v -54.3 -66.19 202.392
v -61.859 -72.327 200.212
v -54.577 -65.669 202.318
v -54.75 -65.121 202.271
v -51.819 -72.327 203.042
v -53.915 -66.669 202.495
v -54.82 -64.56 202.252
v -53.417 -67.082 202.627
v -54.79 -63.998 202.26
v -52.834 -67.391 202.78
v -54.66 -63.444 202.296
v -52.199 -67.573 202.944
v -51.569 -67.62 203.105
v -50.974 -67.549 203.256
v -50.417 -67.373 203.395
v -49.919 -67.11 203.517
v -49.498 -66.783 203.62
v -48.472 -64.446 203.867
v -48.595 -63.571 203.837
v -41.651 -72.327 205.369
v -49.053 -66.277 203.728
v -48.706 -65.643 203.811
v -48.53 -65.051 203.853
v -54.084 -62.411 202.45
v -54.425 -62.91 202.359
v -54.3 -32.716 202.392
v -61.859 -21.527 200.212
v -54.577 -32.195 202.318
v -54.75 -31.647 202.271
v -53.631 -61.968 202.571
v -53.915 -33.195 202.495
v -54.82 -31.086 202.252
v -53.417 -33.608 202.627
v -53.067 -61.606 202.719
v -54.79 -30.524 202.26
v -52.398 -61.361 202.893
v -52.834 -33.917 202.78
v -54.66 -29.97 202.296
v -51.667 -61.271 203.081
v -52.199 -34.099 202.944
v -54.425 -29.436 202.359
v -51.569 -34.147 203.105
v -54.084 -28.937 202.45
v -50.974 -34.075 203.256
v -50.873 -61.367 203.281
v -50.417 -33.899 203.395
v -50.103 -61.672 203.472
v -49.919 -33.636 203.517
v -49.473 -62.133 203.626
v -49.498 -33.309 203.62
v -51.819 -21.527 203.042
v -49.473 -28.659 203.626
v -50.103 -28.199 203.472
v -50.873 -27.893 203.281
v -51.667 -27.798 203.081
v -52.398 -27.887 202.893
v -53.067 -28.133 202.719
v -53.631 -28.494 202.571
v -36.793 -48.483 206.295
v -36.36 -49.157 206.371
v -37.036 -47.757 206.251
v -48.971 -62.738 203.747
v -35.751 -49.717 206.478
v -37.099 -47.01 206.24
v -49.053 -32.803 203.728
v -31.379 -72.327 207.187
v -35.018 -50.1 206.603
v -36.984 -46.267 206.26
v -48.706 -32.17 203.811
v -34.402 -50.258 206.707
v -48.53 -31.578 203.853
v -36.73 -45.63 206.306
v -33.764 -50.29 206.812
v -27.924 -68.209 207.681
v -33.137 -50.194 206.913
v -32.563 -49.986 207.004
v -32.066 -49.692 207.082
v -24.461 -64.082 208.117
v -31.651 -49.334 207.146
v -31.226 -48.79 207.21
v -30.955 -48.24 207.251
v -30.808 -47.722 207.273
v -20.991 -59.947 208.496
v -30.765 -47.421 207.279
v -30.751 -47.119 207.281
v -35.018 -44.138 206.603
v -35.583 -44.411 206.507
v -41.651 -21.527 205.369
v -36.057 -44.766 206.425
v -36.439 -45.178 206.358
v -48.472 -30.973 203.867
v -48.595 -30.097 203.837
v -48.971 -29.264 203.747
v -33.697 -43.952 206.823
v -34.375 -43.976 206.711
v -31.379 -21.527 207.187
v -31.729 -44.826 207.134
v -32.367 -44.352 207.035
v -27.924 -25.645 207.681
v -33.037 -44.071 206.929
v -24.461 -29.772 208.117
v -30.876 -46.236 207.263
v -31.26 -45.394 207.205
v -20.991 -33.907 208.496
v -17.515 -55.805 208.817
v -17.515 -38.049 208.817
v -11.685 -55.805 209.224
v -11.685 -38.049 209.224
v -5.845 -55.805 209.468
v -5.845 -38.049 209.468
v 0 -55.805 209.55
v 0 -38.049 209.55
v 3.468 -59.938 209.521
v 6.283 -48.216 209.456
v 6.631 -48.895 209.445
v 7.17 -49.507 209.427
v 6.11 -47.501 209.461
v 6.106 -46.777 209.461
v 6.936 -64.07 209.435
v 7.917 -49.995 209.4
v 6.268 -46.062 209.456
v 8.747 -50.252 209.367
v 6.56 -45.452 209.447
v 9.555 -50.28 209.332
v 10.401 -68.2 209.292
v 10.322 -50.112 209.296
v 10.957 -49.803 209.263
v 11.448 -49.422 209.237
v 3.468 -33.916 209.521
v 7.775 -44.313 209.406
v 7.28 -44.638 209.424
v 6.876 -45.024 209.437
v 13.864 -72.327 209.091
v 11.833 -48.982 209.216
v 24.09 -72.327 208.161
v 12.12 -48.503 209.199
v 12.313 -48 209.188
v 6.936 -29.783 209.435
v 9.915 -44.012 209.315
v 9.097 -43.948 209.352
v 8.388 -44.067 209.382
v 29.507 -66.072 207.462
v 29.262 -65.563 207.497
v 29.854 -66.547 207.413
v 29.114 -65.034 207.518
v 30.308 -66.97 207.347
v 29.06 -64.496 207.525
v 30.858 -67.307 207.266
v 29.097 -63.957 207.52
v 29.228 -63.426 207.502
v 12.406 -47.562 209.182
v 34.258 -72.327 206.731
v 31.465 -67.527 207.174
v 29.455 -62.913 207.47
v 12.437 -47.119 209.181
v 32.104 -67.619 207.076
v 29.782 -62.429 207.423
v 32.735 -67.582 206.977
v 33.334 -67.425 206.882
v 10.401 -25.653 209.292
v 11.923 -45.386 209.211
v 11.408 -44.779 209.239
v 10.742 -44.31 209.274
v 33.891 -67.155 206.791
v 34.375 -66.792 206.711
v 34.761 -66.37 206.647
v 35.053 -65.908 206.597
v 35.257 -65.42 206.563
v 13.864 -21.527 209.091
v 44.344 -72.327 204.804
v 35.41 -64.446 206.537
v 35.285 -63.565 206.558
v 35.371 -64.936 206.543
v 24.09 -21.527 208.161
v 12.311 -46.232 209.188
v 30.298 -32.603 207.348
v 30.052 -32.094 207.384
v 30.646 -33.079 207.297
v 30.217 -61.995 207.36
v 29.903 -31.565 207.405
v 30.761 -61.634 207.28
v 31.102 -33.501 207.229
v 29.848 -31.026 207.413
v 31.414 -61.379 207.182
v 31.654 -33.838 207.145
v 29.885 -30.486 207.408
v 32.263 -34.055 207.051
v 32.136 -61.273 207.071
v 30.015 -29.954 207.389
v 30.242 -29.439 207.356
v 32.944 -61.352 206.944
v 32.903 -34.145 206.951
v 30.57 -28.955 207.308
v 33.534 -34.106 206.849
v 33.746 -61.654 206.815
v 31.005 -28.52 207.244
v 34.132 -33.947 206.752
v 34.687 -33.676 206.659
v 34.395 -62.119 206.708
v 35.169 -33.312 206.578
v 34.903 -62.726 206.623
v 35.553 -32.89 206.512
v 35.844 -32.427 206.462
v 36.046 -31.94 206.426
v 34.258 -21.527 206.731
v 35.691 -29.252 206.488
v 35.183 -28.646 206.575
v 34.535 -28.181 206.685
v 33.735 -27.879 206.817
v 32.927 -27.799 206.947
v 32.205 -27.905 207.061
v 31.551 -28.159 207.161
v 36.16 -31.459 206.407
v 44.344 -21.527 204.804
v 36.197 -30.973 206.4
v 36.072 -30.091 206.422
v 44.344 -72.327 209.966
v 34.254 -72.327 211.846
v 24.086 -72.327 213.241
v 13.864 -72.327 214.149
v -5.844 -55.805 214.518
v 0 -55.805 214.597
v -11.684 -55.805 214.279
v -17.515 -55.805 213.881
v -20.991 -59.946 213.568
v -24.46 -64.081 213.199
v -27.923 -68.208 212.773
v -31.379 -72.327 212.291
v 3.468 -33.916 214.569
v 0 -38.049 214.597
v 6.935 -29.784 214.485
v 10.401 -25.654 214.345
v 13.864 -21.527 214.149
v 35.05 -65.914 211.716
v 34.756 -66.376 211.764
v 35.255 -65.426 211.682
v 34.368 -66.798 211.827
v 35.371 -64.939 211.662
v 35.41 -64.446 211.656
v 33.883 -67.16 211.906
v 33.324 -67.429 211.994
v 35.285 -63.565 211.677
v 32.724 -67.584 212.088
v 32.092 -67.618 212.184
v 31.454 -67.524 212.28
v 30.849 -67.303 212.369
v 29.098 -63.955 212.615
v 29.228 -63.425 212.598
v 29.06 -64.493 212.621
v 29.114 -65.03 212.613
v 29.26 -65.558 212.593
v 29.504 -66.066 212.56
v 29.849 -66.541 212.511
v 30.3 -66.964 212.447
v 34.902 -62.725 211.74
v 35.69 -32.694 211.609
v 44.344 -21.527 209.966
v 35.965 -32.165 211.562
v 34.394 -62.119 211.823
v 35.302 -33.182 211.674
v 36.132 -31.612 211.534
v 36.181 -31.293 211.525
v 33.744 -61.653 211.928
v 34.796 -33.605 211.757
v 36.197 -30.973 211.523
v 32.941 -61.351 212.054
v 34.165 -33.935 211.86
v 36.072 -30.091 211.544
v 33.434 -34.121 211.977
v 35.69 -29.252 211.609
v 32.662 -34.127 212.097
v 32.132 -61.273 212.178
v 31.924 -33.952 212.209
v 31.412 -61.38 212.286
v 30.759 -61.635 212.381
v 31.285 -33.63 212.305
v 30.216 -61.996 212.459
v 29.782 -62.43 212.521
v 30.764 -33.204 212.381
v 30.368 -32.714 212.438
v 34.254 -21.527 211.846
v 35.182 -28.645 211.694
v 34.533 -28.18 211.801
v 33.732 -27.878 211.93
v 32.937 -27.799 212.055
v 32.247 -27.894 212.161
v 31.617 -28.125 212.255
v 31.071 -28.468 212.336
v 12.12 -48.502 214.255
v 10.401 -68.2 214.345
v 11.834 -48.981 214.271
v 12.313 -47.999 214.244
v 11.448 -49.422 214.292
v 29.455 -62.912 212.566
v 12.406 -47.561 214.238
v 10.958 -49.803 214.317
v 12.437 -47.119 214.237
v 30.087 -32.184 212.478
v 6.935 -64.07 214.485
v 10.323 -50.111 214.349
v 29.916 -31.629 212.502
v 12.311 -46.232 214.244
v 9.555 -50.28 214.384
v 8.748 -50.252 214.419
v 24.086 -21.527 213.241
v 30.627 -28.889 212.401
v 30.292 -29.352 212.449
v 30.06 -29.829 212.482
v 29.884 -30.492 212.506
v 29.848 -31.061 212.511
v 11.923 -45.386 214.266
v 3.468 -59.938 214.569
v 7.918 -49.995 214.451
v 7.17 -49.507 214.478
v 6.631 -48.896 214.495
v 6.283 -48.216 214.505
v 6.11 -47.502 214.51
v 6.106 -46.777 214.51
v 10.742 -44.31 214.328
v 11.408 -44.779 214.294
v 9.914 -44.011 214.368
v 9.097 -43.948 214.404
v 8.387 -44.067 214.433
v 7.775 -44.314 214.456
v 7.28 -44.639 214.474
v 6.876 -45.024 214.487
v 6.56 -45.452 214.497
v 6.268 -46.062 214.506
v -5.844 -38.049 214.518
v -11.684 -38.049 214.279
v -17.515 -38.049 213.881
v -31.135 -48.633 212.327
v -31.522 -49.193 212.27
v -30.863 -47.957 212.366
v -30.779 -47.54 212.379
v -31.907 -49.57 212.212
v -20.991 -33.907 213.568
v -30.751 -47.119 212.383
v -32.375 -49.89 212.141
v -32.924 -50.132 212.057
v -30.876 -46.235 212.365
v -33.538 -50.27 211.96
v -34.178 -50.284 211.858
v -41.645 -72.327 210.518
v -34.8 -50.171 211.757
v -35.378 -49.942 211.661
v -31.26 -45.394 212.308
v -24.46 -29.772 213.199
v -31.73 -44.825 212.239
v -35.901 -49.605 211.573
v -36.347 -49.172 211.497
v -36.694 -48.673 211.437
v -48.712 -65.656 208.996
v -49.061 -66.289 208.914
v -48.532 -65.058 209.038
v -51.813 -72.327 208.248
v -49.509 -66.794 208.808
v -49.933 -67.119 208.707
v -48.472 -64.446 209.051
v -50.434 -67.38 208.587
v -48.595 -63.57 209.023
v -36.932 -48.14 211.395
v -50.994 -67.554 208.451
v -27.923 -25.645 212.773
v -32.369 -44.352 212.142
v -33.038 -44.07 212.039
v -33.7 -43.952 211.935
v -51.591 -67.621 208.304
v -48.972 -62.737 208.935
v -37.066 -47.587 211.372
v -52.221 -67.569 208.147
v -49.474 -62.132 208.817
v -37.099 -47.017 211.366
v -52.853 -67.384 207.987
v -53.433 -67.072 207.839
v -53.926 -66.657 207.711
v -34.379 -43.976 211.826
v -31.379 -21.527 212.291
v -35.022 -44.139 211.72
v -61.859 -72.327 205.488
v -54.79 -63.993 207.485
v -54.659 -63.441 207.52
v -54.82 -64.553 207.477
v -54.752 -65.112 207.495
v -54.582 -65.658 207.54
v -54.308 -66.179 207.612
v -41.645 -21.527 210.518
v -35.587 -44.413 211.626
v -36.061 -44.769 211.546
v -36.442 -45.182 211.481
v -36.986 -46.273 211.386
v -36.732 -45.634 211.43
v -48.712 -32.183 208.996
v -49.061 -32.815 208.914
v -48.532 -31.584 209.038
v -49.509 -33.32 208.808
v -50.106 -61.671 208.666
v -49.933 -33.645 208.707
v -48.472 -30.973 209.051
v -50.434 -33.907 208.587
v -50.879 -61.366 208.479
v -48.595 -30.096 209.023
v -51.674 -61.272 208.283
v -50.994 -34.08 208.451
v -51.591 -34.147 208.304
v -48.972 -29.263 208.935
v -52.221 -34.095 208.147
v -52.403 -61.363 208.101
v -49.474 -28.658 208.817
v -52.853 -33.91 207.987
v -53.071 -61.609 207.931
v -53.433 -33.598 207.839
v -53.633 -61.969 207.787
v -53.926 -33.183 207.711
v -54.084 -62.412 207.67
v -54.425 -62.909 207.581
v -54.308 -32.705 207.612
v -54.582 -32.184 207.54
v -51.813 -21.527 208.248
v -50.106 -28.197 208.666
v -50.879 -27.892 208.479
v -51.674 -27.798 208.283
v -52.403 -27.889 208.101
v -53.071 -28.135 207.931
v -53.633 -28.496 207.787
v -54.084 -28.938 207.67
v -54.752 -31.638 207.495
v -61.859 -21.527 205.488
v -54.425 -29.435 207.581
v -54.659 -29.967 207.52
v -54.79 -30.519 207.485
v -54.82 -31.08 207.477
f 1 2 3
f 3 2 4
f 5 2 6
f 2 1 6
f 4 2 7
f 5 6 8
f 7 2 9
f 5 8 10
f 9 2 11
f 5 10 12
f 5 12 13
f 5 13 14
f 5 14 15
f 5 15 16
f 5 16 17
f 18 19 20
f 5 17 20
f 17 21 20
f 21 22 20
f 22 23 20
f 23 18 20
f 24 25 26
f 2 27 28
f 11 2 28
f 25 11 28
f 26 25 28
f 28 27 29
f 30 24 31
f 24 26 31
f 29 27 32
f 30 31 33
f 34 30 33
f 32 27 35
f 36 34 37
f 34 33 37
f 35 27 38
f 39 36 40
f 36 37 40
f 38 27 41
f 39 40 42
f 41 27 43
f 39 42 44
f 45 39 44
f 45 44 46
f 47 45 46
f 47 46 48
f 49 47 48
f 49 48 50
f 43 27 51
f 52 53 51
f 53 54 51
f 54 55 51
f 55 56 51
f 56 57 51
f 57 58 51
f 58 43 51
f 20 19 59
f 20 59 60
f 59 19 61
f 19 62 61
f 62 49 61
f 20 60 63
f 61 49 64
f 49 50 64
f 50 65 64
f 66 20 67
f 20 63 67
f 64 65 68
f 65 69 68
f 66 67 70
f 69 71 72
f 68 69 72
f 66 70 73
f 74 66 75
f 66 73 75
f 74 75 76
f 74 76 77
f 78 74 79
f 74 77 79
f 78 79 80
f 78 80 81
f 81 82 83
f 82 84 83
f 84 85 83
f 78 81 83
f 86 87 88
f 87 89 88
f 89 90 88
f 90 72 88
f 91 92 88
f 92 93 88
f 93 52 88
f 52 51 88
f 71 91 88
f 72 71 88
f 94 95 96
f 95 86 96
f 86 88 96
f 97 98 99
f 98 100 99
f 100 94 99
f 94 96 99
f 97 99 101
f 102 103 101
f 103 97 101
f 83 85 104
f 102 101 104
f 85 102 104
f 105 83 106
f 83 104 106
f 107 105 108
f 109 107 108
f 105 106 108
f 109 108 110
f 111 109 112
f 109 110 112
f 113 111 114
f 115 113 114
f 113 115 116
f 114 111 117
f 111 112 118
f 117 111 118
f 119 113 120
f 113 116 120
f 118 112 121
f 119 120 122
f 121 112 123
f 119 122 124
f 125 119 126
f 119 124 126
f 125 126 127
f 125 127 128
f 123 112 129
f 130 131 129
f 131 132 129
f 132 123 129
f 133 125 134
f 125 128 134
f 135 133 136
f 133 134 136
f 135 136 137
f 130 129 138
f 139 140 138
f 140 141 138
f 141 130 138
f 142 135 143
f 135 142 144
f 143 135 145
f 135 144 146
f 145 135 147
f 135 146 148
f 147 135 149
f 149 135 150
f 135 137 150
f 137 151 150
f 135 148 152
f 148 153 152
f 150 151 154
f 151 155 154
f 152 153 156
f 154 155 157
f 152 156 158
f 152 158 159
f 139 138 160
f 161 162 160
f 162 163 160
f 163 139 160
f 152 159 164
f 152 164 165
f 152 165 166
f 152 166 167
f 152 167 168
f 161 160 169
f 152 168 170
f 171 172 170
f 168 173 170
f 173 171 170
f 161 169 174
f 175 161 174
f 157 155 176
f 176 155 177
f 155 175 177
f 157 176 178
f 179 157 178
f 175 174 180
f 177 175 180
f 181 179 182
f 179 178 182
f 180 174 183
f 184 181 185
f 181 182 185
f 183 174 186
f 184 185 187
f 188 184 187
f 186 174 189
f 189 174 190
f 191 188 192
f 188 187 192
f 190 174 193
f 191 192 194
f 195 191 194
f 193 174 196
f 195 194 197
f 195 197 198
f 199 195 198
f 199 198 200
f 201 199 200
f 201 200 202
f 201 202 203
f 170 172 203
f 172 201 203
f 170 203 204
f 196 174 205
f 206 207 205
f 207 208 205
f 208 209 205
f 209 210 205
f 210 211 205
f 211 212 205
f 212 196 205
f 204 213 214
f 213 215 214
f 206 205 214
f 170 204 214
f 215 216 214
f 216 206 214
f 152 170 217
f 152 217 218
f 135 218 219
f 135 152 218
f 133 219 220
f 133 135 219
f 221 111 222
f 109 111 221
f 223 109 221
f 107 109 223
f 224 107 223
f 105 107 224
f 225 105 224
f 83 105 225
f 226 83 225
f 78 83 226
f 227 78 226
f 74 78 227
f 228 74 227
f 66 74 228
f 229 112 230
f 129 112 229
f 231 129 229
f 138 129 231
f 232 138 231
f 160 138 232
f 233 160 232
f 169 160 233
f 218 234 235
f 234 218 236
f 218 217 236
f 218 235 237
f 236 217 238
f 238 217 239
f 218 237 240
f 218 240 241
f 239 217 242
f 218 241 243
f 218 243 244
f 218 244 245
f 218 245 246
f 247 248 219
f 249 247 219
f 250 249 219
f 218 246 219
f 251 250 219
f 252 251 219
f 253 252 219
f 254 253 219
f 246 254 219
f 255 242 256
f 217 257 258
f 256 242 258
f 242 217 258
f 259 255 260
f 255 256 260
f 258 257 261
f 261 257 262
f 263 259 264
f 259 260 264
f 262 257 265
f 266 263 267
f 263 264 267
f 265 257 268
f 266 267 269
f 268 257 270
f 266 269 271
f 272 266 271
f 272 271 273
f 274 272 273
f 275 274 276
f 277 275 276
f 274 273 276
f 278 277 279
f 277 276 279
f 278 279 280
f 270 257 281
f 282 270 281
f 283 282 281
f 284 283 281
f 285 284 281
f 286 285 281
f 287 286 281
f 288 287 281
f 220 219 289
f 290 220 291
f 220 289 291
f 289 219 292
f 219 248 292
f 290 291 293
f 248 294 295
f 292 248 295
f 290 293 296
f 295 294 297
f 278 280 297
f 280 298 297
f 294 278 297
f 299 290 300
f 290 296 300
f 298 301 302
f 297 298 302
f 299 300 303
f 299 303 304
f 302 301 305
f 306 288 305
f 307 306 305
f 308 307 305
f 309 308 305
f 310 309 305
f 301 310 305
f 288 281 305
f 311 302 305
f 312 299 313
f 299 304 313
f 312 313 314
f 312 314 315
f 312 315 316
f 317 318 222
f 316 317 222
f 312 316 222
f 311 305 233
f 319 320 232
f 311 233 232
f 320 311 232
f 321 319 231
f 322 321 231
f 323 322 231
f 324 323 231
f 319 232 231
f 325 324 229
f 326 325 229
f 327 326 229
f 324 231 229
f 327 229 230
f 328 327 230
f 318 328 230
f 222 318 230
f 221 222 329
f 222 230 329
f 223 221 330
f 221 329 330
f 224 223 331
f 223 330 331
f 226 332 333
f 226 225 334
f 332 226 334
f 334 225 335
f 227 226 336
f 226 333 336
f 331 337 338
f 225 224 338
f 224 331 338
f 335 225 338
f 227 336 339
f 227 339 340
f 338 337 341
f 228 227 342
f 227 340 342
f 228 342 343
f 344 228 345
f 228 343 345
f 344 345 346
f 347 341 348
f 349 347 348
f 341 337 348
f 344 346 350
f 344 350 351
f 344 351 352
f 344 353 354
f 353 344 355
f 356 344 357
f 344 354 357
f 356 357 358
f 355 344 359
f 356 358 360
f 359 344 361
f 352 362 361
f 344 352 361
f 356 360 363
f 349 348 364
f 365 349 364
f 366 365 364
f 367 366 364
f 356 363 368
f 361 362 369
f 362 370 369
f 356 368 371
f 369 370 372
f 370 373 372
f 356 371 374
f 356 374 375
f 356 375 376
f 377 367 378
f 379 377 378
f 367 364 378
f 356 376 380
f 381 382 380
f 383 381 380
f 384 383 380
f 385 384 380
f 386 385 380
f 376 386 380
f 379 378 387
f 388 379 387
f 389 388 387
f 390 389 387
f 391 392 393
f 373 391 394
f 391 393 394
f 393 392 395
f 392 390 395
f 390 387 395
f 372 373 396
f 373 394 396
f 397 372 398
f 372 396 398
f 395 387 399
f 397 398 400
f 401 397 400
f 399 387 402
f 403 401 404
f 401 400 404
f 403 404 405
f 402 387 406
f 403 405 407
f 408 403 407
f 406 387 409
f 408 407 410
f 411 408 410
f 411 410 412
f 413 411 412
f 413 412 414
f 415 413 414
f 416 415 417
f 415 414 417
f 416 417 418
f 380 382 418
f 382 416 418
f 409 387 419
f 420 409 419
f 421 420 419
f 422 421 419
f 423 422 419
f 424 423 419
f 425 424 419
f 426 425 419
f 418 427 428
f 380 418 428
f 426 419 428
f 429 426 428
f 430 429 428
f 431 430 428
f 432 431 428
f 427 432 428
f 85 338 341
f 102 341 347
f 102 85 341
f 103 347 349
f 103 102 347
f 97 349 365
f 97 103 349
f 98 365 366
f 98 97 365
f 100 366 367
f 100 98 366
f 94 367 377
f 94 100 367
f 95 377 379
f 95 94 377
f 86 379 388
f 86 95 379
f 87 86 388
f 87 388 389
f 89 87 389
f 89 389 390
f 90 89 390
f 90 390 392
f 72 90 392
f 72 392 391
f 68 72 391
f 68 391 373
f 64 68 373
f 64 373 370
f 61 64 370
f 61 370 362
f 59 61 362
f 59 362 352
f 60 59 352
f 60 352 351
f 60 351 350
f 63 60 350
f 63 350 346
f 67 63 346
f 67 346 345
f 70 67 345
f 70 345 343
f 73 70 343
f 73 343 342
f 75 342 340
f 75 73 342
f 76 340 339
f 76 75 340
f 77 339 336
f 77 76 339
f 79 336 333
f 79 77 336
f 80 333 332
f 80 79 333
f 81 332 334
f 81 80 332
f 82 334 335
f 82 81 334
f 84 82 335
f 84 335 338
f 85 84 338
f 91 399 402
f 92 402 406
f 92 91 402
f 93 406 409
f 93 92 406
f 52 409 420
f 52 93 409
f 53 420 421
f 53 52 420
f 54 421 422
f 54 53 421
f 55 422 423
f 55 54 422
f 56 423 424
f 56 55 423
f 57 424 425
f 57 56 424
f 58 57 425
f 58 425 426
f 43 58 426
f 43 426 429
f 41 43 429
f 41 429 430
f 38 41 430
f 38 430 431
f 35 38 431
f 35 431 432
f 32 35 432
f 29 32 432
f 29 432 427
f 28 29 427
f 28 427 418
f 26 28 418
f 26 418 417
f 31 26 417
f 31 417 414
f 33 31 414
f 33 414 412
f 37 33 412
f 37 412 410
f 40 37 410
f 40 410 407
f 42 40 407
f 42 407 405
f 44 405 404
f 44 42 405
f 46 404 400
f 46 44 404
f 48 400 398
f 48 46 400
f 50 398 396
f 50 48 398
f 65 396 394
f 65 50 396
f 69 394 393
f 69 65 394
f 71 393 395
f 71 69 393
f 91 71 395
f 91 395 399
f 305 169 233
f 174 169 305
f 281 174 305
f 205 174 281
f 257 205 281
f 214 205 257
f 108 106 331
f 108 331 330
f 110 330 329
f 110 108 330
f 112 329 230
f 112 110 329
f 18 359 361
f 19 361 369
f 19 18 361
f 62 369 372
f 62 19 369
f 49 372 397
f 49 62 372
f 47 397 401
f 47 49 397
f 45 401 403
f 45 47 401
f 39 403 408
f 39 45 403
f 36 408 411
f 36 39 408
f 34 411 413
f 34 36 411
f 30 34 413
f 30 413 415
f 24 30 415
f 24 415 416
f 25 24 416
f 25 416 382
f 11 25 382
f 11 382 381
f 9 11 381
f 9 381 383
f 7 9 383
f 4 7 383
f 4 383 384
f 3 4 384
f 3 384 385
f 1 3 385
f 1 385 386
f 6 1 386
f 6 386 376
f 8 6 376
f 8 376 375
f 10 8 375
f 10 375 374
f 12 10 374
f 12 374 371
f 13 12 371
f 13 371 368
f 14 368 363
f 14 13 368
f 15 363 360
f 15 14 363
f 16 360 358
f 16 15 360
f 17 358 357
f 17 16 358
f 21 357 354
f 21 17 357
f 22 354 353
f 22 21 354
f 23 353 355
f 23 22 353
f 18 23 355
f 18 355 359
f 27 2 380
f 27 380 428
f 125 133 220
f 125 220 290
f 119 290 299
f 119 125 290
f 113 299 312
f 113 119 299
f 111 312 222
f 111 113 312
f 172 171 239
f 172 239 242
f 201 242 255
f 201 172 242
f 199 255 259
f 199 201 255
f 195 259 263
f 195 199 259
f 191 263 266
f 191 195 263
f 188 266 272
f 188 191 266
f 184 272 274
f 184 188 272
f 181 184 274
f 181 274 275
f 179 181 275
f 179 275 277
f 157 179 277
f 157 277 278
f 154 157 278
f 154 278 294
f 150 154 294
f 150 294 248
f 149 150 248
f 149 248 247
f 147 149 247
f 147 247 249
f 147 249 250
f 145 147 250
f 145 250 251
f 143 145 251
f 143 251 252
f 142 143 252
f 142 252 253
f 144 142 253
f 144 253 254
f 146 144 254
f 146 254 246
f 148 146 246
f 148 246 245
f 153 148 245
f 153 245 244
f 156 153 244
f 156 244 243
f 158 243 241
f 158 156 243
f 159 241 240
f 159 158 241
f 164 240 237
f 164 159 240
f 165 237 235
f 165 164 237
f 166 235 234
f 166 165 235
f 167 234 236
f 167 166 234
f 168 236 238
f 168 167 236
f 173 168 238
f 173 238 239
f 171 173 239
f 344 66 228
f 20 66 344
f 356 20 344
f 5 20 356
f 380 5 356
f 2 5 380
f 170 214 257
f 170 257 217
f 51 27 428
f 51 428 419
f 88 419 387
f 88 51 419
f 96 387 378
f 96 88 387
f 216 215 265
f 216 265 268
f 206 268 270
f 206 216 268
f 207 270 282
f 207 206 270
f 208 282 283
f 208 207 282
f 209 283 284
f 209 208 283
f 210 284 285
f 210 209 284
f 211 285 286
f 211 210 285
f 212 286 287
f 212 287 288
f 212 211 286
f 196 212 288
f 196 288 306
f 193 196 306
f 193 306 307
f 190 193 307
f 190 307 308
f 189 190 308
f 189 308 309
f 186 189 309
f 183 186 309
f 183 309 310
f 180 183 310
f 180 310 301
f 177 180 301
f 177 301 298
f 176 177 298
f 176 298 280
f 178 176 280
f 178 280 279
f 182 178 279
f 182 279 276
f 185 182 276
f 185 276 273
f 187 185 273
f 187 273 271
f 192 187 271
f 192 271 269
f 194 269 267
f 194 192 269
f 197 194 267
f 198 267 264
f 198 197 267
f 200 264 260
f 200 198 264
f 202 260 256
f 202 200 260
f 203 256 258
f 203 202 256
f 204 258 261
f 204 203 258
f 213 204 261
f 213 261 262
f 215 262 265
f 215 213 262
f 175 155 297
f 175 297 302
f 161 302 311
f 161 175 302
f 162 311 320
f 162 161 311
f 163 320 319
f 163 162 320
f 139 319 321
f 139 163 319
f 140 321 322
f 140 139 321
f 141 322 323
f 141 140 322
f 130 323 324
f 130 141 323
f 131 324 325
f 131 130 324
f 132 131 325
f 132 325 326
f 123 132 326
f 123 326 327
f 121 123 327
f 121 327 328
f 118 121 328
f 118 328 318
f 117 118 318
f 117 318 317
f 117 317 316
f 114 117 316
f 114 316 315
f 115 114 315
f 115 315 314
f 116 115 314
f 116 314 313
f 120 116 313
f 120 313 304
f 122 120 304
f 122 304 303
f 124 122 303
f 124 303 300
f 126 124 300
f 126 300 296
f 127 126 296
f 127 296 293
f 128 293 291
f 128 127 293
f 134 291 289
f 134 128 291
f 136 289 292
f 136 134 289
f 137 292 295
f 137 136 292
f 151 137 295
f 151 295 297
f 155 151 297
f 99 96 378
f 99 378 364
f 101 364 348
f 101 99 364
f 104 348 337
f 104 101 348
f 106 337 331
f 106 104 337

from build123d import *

# Parameters (mm, degrees)
F1_DEPTH = 85.57783
F2_W     = 470.658332
F2_H     = 132.007137
F3_DEPTH = 332.33001
F4_R     = 3.175
F5_DEPTH = 369.06305


with BuildPart() as f1:
    # F0 (on Front) → F1 (new body)
    with BuildSketch(Plane.XZ):
        with BuildLine():
            ThreePointArc((-209.55, 0), (0, 209.55), (209.55, 0))
            Line((209.55, 0), (214.597345, 0))
            ThreePointArc((214.597345, 0), (0, 214.597345), (-214.597345, 0))
            Line((-214.597345, 0), (-209.55, 0))
        make_face()
    extrude(amount=F1_DEPTH)

    # F2 (on Top) → F3 (cut)
    with BuildSketch(Plane.XY):
        with Locations((5.359113, -37.707031)):
            Rectangle(F2_W, F2_H)
        Polygon((-61.859035, -72.326824), (-61.859035, -21.526824), (-31.379035, -21.526824), (-17.515417, -38.048841), (0, -38.048841), (13.863618, -21.526824), (44.343618, -21.526824), (44.343618, -72.326824), (13.863618, -72.326824), (0, -55.804808), (-17.515417, -55.804808), (-31.379035, -72.326824), align=None, mode=Mode.SUBTRACT)
    extrude(amount=F3_DEPTH, mode=Mode.SUBTRACT)

    # F4 (on Top) → F5 (cut)
    with BuildSketch(Plane.XY):
        with Locations((-51.647099, -30.972526)):
            Circle(F4_R)
        with Locations((-51.647099, -64.446411)):
            Circle(F4_R)
        with Locations((-33.92563, -47.118752)):
            Circle(F4_R)
        with Locations((9.262242, -47.118752)):
            Circle(F4_R)
        with Locations((33.022132, -30.972526)):
            Circle(F4_R)
        with Locations((32.234513, -64.446411)):
            Circle(F4_R)
    extrude(amount=F5_DEPTH, mode=Mode.SUBTRACT)


solid = f1.part
